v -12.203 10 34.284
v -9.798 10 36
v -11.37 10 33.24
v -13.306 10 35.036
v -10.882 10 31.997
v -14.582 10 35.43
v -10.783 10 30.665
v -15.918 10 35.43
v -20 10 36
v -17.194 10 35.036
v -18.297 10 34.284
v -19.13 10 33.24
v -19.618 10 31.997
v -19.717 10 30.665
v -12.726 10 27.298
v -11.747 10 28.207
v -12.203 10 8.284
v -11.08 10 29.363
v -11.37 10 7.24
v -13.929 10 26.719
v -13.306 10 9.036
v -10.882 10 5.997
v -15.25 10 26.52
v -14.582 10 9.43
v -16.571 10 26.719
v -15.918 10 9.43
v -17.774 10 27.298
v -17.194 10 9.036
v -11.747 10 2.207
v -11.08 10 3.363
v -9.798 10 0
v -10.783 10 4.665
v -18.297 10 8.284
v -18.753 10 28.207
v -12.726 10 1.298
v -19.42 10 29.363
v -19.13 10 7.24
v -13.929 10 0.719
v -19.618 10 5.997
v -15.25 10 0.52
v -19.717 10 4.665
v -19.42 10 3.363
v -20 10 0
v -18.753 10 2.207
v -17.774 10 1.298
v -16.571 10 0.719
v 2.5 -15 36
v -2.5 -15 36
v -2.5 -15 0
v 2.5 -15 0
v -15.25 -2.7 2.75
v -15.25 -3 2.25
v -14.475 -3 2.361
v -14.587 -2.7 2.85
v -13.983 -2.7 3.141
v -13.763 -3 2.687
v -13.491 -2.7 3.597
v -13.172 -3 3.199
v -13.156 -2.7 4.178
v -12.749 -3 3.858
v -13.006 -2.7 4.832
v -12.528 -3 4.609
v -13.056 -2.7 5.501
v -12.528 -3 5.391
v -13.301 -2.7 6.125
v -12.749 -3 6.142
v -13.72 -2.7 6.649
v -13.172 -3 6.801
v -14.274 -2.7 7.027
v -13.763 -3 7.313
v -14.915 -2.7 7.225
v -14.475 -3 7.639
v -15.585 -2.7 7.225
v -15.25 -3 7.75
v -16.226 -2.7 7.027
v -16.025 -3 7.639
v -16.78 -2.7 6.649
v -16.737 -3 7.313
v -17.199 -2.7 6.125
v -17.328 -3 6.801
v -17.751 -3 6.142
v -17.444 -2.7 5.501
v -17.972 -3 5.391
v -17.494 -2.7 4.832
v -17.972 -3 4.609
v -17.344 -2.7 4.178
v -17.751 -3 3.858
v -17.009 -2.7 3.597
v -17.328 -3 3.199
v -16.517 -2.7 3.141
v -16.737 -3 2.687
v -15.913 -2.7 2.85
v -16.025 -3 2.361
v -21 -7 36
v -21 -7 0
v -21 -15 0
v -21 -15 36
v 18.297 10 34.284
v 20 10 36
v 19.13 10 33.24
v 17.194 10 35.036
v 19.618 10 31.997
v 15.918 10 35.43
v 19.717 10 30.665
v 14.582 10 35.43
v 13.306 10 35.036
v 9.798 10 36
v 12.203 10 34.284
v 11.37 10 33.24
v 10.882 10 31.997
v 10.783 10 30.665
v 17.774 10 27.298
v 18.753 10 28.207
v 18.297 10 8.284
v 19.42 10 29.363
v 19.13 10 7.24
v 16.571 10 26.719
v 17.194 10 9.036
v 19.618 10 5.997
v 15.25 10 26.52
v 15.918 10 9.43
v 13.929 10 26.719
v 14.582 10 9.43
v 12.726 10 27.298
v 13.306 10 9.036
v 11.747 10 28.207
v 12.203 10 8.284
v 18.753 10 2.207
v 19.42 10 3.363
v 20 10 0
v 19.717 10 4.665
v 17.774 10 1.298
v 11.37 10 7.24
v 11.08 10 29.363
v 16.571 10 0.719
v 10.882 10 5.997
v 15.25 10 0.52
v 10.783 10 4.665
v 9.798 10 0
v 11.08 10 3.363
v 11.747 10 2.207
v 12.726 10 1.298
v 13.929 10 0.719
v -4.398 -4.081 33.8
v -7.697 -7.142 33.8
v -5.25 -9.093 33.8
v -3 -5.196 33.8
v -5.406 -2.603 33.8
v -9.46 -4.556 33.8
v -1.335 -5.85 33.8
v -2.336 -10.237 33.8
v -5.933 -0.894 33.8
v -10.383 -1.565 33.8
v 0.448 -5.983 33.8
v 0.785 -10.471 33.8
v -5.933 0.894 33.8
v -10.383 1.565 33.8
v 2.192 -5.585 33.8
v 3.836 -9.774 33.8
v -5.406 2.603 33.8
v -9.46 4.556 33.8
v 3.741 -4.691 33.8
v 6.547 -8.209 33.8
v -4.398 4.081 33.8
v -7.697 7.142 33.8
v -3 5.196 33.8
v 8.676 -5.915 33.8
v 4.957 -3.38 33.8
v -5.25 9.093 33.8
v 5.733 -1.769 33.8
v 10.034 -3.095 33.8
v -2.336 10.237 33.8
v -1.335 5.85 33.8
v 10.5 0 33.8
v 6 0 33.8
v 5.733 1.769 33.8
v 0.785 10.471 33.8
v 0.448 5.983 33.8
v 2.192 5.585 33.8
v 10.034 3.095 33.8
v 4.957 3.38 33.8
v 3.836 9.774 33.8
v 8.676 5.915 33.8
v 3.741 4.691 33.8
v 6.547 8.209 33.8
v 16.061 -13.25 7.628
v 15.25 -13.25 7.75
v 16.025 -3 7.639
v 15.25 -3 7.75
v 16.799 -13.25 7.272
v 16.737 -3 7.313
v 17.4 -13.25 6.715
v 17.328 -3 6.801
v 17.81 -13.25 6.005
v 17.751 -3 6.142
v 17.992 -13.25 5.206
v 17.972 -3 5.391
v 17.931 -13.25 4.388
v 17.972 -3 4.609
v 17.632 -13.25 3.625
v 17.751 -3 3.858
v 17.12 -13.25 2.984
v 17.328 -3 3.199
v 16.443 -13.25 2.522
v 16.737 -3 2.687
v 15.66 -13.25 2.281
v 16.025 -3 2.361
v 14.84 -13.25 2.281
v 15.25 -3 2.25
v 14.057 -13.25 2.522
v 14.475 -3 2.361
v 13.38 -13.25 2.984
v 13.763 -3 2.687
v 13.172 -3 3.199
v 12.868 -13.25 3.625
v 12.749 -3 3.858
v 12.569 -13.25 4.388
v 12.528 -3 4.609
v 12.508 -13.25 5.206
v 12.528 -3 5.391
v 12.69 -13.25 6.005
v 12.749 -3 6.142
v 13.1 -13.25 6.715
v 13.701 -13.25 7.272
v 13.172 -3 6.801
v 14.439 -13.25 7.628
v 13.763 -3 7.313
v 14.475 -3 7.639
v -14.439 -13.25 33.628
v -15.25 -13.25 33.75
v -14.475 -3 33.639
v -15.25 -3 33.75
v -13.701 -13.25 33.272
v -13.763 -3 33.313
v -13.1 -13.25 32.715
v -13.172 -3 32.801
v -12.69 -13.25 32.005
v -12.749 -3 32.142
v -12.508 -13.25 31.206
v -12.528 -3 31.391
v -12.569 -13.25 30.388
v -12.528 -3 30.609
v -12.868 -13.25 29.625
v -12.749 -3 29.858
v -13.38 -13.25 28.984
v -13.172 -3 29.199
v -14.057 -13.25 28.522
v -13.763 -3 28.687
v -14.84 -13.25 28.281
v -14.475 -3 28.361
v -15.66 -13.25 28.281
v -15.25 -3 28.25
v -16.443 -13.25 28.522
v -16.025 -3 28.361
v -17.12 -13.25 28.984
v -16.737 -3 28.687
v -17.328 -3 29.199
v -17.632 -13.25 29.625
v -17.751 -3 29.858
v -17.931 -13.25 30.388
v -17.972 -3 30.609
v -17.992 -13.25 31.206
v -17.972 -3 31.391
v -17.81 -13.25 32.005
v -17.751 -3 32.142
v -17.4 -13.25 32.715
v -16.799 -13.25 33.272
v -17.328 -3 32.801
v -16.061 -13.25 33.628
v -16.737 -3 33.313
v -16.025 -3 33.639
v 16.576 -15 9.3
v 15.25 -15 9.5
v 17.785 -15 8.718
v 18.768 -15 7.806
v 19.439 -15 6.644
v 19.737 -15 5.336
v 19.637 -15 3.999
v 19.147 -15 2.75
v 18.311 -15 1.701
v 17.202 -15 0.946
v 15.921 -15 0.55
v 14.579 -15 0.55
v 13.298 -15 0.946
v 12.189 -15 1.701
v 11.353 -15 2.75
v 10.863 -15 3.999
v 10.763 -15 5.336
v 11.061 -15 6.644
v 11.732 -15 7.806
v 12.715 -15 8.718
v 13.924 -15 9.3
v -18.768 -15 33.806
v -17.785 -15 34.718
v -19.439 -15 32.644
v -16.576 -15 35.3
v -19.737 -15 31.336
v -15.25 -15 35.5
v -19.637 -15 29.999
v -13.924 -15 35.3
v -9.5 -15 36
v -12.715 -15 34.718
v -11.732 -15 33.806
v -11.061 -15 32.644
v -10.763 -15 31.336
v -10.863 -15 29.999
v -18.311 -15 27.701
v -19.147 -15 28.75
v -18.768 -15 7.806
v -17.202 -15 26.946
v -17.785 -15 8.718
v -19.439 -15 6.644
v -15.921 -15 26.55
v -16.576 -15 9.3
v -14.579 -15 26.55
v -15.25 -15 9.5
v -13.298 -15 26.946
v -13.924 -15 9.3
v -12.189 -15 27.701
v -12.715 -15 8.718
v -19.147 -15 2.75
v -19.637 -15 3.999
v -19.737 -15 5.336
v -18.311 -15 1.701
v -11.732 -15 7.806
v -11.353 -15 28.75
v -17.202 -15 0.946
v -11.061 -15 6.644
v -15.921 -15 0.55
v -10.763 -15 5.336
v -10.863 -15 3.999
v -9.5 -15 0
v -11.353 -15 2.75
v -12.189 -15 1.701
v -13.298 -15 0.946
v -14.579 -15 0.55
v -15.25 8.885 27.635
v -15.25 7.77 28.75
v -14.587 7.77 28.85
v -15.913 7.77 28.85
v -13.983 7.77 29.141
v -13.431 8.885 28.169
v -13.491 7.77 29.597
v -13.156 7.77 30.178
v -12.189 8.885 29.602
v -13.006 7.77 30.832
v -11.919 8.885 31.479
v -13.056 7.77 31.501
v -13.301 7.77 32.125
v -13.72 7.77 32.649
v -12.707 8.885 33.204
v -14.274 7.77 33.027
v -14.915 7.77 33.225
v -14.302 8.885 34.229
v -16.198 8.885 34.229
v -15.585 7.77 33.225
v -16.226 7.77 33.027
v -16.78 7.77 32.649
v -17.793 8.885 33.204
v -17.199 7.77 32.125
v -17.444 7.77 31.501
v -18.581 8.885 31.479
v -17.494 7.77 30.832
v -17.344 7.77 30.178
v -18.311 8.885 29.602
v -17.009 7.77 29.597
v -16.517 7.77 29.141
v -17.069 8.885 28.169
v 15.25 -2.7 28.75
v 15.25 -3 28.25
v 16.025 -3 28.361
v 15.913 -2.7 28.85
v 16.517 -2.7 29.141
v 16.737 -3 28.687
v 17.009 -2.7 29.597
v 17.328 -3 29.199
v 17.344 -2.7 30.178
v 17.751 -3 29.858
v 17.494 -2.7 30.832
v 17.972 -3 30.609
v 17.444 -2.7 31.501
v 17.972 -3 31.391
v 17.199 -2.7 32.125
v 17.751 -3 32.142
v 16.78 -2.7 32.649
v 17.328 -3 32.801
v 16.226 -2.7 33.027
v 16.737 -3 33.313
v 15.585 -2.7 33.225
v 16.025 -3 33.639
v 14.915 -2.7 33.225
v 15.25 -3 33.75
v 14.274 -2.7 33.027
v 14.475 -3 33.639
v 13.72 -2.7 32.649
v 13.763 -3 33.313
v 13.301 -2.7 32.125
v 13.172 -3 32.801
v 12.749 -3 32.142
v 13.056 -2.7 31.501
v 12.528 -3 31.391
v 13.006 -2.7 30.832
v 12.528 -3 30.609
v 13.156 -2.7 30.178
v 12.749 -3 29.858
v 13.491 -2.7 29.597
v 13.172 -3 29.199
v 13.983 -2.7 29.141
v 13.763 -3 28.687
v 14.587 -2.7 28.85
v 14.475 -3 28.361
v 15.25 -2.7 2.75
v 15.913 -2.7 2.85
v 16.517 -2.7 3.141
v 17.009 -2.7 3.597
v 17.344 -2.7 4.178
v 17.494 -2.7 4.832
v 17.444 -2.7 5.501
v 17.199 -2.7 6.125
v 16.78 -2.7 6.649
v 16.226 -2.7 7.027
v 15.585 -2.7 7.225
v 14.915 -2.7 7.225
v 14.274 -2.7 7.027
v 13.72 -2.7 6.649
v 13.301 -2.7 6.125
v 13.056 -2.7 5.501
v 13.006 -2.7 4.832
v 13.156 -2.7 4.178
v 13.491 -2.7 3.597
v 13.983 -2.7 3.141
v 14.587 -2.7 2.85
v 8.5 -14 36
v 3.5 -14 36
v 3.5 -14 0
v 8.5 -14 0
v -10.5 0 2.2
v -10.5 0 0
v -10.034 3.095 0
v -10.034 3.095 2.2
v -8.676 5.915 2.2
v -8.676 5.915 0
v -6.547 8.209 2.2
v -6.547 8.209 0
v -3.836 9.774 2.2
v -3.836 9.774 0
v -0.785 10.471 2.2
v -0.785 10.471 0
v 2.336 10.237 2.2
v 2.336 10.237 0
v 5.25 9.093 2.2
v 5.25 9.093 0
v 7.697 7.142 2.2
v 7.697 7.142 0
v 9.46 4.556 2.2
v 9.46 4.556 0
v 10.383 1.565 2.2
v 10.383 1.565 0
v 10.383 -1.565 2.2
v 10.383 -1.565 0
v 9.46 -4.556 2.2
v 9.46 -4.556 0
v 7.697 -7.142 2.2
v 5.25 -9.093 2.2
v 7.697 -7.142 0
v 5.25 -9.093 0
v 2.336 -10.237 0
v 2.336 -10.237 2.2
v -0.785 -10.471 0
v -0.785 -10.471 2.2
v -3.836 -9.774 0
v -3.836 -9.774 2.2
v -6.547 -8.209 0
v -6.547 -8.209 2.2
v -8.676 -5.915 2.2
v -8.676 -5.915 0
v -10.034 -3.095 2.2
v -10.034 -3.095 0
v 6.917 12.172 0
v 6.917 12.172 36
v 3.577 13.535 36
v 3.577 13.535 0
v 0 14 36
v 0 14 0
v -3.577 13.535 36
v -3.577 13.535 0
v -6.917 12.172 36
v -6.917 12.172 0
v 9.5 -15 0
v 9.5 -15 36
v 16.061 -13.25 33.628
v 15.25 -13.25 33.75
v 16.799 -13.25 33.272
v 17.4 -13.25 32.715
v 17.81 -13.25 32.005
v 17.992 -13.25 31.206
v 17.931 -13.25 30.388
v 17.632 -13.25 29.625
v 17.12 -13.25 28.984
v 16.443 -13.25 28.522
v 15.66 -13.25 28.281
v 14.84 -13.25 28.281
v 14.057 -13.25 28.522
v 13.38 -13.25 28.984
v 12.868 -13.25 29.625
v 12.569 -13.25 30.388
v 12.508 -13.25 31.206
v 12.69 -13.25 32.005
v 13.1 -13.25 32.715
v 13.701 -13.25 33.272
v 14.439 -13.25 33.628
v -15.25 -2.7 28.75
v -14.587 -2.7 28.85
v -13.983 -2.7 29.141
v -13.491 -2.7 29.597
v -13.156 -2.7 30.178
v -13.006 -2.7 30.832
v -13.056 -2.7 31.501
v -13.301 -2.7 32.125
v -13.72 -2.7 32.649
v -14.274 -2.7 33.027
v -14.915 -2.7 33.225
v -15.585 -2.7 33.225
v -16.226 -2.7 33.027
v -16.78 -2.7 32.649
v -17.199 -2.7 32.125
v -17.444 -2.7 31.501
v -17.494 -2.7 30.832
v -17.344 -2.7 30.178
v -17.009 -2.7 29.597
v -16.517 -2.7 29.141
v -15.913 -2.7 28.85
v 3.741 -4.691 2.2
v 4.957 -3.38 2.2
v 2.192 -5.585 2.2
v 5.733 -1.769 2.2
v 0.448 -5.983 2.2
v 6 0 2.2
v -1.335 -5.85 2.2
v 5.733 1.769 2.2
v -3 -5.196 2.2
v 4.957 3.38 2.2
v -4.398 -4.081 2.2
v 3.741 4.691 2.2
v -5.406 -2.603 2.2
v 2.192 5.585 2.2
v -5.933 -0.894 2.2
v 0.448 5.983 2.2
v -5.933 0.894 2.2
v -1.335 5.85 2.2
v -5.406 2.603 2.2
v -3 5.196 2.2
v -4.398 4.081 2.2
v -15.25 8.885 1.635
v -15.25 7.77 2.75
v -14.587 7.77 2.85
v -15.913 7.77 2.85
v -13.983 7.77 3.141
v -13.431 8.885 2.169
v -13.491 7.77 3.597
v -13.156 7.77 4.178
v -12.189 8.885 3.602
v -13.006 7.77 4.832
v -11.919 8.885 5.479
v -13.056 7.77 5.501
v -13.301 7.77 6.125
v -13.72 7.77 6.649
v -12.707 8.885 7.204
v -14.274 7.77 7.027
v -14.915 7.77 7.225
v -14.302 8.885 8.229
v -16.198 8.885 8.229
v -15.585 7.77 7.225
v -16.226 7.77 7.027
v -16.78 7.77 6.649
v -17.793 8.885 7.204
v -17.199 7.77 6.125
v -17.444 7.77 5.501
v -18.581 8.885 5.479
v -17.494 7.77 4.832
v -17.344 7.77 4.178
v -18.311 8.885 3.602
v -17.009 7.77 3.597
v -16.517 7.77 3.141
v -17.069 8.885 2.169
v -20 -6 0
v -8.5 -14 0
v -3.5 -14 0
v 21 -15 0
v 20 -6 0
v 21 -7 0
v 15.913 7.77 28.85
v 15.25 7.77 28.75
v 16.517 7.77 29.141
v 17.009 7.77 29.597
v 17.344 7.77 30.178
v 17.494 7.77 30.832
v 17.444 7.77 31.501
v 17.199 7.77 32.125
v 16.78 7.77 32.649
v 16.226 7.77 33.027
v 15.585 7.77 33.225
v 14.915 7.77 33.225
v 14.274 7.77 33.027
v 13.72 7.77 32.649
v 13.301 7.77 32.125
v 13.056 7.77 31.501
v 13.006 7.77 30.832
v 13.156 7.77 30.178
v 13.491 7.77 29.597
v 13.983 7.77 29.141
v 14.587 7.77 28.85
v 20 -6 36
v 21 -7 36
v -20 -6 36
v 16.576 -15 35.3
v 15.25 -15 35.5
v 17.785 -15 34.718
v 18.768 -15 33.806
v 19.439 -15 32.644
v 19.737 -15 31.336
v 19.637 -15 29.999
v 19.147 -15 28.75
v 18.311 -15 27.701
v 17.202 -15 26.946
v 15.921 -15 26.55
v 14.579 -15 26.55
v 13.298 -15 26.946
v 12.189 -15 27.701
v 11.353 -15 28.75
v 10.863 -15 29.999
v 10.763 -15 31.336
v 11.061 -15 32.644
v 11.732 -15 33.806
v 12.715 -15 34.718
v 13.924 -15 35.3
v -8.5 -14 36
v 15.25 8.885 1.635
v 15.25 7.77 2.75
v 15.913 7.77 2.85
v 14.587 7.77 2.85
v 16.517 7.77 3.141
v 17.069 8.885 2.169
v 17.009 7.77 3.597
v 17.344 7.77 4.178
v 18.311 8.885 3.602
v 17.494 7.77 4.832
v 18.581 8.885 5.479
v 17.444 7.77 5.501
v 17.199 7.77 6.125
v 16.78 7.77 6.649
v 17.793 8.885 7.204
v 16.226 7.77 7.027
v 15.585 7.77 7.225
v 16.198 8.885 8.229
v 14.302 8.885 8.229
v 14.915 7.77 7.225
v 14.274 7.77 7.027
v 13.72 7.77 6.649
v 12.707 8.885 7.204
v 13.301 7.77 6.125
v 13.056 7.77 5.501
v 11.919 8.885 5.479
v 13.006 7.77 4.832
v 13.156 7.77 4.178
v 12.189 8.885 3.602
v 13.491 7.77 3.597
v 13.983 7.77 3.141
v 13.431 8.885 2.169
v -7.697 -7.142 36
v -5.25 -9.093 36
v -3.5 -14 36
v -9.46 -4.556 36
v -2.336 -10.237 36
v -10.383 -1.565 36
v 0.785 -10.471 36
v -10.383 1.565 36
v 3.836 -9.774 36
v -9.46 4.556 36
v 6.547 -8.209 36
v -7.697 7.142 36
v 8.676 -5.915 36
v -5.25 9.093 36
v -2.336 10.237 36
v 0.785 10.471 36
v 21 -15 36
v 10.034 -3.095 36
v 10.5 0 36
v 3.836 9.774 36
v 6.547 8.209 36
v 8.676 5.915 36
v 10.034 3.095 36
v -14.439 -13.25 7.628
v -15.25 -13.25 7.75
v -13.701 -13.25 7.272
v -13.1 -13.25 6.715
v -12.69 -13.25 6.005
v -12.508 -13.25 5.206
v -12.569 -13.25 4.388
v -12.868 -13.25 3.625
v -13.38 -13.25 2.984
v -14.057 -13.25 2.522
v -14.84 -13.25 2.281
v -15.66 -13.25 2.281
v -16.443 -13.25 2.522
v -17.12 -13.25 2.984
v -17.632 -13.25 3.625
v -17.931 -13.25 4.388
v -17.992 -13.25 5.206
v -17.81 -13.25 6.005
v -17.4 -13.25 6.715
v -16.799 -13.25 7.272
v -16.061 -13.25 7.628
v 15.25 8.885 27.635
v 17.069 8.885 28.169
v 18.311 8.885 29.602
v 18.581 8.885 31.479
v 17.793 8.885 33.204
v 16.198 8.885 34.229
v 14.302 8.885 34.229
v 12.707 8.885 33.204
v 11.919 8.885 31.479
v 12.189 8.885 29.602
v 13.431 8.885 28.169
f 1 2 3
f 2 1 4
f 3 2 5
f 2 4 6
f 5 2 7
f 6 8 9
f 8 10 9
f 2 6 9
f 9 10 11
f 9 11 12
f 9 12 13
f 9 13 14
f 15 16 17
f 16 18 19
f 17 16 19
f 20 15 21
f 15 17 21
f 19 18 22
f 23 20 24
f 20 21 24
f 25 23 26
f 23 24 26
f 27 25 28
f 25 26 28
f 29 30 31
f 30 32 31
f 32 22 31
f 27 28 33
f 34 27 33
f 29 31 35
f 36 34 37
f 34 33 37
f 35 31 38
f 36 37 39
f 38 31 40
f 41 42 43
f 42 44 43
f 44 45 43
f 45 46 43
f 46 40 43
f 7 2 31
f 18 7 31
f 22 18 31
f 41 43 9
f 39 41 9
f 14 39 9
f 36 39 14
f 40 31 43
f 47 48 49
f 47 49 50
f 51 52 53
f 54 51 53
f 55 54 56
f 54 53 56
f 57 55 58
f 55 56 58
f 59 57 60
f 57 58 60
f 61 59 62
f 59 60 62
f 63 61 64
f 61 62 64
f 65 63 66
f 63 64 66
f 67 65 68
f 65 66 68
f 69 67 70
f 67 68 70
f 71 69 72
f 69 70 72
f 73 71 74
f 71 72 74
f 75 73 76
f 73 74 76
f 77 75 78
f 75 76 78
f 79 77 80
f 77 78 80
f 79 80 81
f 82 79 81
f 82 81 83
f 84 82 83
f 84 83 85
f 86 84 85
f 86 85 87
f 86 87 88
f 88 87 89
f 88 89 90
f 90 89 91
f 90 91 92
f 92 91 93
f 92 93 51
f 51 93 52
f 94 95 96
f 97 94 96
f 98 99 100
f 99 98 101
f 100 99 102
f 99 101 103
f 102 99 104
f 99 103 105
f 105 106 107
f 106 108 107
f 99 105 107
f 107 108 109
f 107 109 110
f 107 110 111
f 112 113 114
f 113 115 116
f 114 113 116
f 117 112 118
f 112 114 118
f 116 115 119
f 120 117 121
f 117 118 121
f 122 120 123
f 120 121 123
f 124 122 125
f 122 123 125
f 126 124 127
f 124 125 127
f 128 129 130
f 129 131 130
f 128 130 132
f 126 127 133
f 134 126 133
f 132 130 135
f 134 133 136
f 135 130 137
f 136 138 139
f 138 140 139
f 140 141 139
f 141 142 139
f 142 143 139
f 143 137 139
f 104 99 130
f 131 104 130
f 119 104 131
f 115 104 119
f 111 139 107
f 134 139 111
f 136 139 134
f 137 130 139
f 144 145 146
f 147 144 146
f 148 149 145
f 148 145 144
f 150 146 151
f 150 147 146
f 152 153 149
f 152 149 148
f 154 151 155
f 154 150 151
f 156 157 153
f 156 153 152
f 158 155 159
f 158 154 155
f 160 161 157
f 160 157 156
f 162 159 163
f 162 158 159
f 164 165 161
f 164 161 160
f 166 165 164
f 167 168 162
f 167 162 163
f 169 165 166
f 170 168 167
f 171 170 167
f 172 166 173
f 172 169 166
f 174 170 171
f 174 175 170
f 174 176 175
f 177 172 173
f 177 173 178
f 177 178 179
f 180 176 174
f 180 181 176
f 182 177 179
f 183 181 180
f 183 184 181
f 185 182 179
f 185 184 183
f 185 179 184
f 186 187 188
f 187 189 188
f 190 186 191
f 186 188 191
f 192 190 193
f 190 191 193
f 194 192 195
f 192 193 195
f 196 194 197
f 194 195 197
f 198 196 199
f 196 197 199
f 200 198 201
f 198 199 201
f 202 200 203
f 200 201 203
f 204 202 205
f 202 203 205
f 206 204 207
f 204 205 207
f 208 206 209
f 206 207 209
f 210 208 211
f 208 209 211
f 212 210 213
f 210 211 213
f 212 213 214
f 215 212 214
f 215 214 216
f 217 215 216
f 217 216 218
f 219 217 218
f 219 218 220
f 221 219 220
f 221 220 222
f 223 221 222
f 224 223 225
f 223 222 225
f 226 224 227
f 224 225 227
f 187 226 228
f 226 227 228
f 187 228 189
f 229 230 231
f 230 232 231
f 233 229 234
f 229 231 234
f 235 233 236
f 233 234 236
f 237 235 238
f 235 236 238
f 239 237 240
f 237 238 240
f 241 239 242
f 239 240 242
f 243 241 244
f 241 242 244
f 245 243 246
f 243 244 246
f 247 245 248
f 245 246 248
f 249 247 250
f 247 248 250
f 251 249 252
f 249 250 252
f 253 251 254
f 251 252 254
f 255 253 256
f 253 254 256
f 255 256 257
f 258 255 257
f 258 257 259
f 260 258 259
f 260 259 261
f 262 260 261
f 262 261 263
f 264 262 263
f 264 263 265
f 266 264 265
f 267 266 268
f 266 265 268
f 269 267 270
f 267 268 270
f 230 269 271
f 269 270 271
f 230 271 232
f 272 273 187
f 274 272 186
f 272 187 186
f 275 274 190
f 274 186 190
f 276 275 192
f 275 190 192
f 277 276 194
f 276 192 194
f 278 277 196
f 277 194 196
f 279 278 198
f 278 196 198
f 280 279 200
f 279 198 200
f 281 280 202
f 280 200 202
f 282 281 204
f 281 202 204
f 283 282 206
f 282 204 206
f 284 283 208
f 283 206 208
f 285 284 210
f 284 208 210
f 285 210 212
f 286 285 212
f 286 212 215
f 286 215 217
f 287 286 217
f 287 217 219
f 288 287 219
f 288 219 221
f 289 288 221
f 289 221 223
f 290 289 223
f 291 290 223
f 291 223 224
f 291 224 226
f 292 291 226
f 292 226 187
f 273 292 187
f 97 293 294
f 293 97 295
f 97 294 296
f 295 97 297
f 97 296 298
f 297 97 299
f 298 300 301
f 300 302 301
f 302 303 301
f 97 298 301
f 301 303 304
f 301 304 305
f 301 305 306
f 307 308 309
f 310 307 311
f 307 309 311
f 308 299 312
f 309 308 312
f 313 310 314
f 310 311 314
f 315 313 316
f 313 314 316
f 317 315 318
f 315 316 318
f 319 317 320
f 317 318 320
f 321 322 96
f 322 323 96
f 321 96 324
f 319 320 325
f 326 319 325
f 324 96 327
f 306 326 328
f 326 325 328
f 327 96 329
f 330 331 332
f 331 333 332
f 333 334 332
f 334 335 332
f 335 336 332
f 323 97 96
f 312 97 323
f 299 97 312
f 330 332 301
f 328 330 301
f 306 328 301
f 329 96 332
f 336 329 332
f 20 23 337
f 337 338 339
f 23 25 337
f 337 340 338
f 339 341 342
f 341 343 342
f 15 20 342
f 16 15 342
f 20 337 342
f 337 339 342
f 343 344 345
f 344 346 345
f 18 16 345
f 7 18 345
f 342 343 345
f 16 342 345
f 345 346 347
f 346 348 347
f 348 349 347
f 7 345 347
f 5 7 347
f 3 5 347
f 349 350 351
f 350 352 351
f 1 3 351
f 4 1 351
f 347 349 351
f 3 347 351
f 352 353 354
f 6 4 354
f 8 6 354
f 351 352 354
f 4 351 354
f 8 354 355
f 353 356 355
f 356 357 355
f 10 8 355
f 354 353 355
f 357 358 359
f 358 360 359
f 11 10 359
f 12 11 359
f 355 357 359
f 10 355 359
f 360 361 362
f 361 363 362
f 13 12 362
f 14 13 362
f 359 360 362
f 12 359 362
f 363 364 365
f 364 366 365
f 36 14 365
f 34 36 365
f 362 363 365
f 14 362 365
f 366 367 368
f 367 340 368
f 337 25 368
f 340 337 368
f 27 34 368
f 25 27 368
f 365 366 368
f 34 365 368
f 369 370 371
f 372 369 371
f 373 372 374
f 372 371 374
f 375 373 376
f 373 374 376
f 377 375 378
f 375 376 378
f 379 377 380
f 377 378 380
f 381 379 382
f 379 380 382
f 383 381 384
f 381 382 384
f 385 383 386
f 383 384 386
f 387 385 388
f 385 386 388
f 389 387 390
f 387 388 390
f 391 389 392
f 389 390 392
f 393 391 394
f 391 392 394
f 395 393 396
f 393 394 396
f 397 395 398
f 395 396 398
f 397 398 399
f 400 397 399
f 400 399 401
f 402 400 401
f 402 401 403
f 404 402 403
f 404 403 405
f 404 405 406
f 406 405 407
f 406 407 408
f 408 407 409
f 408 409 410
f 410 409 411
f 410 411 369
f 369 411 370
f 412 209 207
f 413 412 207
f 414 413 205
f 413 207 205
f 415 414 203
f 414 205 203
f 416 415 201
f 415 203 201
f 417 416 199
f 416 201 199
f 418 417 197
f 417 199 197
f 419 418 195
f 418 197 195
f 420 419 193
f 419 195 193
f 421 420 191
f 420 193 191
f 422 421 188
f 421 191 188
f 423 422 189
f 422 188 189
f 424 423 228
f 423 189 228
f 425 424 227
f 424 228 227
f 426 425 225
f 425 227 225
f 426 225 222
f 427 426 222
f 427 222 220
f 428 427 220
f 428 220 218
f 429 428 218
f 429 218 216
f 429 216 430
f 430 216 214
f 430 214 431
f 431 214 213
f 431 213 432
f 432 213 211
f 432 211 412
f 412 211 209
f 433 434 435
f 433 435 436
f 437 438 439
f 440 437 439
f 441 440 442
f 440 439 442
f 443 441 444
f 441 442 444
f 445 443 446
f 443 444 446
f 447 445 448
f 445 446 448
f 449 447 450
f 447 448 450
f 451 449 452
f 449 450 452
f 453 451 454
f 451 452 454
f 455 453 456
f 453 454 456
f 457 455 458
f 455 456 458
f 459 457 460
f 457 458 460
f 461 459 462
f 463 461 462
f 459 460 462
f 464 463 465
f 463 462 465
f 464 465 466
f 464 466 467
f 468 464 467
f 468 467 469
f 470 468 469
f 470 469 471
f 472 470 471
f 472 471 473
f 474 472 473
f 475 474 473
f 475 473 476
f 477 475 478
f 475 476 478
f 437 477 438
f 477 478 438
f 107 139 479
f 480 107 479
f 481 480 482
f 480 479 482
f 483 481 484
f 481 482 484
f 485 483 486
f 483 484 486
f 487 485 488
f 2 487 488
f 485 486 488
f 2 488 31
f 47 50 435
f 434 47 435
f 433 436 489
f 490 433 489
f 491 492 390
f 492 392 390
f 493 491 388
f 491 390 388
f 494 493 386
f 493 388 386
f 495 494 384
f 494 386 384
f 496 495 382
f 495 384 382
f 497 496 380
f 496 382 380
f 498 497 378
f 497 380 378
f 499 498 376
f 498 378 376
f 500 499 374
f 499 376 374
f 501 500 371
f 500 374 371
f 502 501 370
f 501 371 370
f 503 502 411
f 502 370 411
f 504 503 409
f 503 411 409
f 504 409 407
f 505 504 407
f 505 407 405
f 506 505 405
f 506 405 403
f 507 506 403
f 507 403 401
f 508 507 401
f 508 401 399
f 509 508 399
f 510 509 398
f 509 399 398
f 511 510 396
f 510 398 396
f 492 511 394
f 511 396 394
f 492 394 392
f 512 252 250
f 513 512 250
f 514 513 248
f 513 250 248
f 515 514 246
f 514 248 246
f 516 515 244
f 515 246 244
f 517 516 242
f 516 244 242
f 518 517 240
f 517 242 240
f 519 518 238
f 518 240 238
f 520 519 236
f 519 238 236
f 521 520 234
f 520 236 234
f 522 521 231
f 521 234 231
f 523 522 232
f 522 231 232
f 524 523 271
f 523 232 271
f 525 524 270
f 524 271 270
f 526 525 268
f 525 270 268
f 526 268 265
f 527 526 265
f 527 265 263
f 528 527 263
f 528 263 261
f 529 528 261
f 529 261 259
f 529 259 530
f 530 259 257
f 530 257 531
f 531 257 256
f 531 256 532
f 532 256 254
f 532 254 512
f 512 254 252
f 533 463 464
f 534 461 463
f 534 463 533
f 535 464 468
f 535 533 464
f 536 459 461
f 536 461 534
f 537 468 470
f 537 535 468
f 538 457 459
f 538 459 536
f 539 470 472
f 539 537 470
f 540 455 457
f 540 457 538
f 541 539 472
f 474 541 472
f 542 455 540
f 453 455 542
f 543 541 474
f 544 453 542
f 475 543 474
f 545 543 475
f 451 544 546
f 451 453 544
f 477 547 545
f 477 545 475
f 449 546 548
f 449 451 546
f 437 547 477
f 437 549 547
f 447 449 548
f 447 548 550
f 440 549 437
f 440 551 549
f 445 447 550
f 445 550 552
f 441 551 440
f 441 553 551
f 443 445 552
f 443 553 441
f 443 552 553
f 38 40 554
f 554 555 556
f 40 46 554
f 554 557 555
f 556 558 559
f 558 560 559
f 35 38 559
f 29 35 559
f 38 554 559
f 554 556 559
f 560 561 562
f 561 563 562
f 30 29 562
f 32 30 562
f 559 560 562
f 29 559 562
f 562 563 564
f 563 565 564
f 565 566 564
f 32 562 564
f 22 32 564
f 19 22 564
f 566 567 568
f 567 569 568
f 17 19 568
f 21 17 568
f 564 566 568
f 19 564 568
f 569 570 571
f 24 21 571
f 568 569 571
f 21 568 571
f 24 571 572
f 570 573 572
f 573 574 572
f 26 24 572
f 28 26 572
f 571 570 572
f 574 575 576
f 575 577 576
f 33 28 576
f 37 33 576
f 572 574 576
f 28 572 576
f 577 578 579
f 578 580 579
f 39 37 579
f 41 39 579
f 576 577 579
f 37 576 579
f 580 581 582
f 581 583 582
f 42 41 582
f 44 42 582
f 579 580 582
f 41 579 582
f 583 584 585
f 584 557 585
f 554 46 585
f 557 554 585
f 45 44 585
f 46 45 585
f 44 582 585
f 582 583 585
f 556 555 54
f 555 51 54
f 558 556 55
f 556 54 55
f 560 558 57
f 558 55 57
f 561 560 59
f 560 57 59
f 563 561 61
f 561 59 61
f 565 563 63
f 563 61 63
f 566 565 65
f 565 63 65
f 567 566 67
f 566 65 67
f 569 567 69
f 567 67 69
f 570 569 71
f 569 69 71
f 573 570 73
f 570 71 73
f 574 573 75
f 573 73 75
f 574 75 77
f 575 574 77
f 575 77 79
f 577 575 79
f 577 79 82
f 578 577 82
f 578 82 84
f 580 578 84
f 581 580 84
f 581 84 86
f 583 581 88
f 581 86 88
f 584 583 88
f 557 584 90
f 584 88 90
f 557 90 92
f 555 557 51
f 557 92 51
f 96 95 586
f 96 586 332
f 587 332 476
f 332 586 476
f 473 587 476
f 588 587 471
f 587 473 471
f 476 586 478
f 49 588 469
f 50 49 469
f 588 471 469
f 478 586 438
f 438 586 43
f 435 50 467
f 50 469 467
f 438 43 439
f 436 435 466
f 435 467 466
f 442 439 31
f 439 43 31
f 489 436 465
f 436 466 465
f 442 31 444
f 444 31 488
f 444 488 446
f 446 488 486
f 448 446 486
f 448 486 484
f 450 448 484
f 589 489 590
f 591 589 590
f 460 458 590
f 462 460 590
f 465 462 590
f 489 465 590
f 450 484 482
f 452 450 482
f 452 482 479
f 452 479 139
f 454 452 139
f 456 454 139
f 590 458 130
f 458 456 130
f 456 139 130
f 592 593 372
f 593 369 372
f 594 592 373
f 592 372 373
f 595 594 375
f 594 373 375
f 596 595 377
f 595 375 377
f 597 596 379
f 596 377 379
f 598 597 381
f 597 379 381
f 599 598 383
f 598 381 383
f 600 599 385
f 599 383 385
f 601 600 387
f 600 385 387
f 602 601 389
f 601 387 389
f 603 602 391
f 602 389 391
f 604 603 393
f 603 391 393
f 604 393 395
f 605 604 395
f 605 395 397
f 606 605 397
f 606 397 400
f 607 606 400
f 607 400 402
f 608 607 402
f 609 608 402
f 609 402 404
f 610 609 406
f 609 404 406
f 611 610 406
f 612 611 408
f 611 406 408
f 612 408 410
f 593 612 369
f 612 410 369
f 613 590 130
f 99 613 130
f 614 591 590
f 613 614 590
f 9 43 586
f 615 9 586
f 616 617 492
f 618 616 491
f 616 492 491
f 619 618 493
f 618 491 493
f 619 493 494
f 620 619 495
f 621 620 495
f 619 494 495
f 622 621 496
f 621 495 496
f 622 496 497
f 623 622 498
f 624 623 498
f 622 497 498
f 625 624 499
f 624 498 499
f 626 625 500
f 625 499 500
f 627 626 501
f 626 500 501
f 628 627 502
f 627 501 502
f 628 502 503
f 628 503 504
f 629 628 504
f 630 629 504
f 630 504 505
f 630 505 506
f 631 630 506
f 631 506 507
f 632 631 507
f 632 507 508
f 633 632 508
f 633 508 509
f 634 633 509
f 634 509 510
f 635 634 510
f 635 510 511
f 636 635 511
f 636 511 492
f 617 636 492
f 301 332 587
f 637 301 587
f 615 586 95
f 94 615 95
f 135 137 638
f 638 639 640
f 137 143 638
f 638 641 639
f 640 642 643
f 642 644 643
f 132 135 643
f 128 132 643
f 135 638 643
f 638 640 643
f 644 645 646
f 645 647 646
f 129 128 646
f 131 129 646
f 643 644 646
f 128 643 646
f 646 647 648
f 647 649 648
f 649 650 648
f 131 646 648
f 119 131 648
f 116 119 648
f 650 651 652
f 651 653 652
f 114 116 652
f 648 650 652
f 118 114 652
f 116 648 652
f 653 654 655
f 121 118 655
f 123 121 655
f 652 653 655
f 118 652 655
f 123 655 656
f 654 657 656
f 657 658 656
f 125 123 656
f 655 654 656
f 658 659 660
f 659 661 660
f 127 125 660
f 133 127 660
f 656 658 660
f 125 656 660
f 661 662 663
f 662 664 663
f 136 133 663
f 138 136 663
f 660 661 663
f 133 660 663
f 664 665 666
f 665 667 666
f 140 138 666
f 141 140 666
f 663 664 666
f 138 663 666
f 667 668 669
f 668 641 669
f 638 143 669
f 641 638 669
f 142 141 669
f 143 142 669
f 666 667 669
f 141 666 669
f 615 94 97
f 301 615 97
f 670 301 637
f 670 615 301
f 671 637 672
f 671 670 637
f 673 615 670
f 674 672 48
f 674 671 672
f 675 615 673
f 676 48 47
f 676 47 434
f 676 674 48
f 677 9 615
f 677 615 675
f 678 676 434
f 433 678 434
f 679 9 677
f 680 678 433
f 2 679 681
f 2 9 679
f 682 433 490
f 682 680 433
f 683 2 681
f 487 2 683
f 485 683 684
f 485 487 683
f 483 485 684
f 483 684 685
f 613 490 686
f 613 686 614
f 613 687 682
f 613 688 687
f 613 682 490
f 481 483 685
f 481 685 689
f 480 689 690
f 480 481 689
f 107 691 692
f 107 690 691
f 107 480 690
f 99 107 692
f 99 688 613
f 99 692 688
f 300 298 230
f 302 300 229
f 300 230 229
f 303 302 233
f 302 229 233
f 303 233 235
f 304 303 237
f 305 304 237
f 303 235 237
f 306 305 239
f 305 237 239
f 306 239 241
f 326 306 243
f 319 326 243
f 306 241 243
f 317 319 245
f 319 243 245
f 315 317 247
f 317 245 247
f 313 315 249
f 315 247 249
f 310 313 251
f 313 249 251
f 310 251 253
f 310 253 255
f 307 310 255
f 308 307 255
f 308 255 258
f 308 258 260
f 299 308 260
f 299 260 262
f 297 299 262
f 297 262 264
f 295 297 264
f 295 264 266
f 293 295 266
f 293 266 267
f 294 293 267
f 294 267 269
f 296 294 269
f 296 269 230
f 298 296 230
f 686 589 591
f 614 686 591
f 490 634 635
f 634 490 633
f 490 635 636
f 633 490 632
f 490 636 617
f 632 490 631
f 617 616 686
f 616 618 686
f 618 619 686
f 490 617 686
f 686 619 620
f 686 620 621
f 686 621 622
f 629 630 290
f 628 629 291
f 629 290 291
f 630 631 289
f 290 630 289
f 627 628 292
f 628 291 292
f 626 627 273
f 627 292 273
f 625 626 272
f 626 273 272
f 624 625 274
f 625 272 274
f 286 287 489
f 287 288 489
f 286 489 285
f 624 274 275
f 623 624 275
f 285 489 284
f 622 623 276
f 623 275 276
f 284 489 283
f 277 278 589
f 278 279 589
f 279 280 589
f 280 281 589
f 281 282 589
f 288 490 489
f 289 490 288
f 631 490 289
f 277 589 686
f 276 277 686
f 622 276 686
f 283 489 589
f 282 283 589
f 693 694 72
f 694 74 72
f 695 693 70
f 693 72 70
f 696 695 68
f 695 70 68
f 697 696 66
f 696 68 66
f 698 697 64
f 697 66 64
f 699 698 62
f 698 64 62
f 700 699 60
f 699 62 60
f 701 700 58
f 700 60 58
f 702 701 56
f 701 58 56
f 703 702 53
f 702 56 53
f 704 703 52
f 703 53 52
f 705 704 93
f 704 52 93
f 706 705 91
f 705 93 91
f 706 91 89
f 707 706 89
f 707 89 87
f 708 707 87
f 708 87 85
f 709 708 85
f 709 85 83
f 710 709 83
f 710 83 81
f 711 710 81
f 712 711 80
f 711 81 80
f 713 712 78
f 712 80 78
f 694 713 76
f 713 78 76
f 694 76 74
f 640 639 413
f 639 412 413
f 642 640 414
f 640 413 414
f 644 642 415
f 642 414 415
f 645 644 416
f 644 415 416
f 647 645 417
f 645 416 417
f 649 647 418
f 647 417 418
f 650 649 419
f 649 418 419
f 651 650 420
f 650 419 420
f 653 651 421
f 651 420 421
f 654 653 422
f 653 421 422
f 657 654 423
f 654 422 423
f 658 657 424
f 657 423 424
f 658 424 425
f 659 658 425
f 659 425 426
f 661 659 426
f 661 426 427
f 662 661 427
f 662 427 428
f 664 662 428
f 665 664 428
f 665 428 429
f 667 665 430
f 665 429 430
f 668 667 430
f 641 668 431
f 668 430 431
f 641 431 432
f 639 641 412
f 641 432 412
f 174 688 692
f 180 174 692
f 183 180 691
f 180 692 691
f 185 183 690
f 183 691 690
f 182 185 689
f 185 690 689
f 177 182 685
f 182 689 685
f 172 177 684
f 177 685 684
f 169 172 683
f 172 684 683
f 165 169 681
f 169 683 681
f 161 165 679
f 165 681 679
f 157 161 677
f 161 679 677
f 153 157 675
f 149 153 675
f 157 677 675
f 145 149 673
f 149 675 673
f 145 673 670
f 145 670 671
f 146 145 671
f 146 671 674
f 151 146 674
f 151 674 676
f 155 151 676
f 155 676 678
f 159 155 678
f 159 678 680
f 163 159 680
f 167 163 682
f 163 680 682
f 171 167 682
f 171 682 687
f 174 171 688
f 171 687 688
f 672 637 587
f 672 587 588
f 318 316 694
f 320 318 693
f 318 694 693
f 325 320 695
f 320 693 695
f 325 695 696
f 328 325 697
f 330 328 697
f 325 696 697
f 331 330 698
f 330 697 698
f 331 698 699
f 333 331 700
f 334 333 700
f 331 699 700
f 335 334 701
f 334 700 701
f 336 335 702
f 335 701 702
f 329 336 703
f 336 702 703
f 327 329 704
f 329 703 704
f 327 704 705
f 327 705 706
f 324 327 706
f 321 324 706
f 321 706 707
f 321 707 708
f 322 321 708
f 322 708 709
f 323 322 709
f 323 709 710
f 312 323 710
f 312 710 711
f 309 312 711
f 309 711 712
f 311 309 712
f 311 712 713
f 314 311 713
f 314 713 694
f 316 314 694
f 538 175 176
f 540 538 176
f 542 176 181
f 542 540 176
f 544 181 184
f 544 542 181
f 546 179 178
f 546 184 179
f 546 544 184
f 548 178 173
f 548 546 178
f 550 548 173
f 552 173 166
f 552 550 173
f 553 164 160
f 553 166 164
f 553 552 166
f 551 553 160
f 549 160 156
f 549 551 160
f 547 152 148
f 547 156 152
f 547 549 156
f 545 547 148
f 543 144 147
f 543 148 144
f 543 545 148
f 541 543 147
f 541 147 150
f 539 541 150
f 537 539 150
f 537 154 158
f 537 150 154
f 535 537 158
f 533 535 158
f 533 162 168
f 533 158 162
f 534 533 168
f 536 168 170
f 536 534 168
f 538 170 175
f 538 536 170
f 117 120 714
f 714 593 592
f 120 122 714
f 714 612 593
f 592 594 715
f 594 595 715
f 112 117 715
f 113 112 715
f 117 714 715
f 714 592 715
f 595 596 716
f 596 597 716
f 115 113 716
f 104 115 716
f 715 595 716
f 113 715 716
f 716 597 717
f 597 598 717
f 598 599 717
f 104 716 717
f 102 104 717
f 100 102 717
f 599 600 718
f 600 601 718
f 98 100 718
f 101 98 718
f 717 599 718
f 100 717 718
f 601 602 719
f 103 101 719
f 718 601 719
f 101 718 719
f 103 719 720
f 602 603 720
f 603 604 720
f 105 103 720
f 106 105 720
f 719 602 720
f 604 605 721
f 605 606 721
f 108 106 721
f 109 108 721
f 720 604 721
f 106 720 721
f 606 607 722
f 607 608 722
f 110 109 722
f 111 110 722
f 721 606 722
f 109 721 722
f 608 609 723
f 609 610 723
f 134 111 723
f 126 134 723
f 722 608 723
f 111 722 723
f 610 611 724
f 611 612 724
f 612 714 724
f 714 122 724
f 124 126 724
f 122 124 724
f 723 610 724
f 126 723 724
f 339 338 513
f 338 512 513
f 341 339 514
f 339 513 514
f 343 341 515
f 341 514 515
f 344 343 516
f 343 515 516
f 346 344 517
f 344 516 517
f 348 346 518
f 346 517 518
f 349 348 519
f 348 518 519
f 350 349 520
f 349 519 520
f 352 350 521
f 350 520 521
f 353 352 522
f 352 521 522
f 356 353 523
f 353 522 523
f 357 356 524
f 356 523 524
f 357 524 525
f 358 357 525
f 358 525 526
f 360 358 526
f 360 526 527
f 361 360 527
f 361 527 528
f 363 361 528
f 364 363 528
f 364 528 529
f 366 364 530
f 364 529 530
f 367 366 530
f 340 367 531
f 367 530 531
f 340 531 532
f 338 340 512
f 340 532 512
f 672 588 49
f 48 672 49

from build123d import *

# Parameters (mm, degrees)
ESBO_O1_R                                            = 6
EXTRUS_O1_DEPTH                                      = 36
ESBO_O2_R                                            = 10.5
EXTRUS_O2_DEPTH                                      = 2.2
ESBO_O3_R                                            = 10.5
EXTRUS_O3_DEPTH                                      = 2.2
ESBO_O4_R                                            = 1.65
EXTRUS_O4_DEPTH                                      = 26
ESCAREADO_PARA_PARAFUSO_DE_M_QUINA_COM_C_D           = 5.5
ESCAREADO_PARA_PARAFUSO_DE_M_QUINA_COM_C_DEPTH       = 12
ESCAREADO_PARA_PARAFUSO_DE_M_QUINA_COM_C_CSINK_D     = 9
ESCAREADO_PARA_PARAFUSO_DE_M_QUINA_COM_C_CSINK_ANGLE = 90
ESCAREADO_PARA_PARAFUSO_DE_M_QUINA_COM_C_TIP         = 1.652366702
ESCAREADO_PARA_SFHCS_M41_D                           = 4.5
ESCAREADO_PARA_SFHCS_M41_CSINK_D                     = 8.96
ESCAREADO_PARA_SFHCS_M41_CSINK_ANGLE                 = 90


with BuildPart() as part:
    # Esboço1 → Extrusão1 (new body)
    with BuildSketch(Plane.XY):
        with BuildLine():
            Line((-20, 10), (-20, -6))
            Line((-20, -6), (-21, -7))
            Line((-21, -7), (-21, -15))
            Line((-21, -15), (-9.5, -15))
            Line((-9.5, -15), (-8.5, -14))
            Line((-8.5, -14), (-3.5, -14))
            Line((-3.5, -14), (-2.5, -15))
            Line((-2.5, -15), (2.5, -15))
            Line((2.5, -15), (3.5, -14))
            Line((3.5, -14), (8.5, -14))
            Line((8.5, -14), (9.5, -15))
            Line((9.5, -15), (21, -15))
            Line((21, -15), (21, -7))
            Line((21, -7), (20, -6))
            Line((20, -6), (20, 10))
            Line((20, 10), (9.797958971, 10))
            ThreePointArc((9.797958971, 10), (0, 14), (-9.797958971, 10))
            Line((-9.797958971, 10), (-20, 10))
        make_face()
        Circle(ESBO_O1_R, mode=Mode.SUBTRACT)
    extrude(amount=EXTRUS_O1_DEPTH)

    # Esboço2 → Extrusão2 (cut)
    with BuildSketch(Plane.XY.offset(36)):
        Circle(ESBO_O2_R)
    extrude(amount=-EXTRUS_O2_DEPTH, mode=Mode.SUBTRACT)

    # Esboço3 → Extrusão3 (cut)
    with BuildSketch(Plane(origin=(0, 0, 0), x_dir=(-1, 0, 0), z_dir=(0, 0, -1))):
        Circle(ESBO_O3_R)
    extrude(amount=-EXTRUS_O3_DEPTH, mode=Mode.SUBTRACT)

    # Esboço4 → Extrusão4 (cut, through all)
    with BuildSketch(Plane(origin=(0, 10, 0), x_dir=(1, 0, 0), z_dir=(0, 1, 0))):
        with Locations((15.25, -5)):
            Circle(ESBO_O4_R)
        with Locations((15.25, -31)):
            Circle(ESBO_O4_R)
        with Locations((-15.25, -5)):
            Circle(ESBO_O4_R)
        with Locations((-15.25, -31)):
            Circle(ESBO_O4_R)
    extrude(amount=-EXTRUS_O4_DEPTH, mode=Mode.SUBTRACT)

    # Escareado para parafuso de máquina com cabeça chata de M52
    with Locations(Plane(origin=(-15.25, -15, 31), x_dir=(0, 0, -1), z_dir=(0, -1, 0))):
        with Locations((0, 0), (26, 0), (26, 30.5), (0, 30.5)):
            CounterSinkHole(ESCAREADO_PARA_PARAFUSO_DE_M_QUINA_COM_C_D / 2, ESCAREADO_PARA_PARAFUSO_DE_M_QUINA_COM_C_CSINK_D / 2, depth=ESCAREADO_PARA_PARAFUSO_DE_M_QUINA_COM_C_DEPTH, counter_sink_angle=ESCAREADO_PARA_PARAFUSO_DE_M_QUINA_COM_C_CSINK_ANGLE)
            with Locations((0, 0, -(ESCAREADO_PARA_PARAFUSO_DE_M_QUINA_COM_C_DEPTH + ESCAREADO_PARA_PARAFUSO_DE_M_QUINA_COM_C_TIP / 2))):  # 118° drill point
                Cone(0, ESCAREADO_PARA_PARAFUSO_DE_M_QUINA_COM_C_D / 2, ESCAREADO_PARA_PARAFUSO_DE_M_QUINA_COM_C_TIP, mode=Mode.SUBTRACT)

    # Escareado para SFHCS M41 (through all)
    with Locations(Plane(origin=(-15.25, 10, 5), x_dir=(0, 0, 1), z_dir=(0, 1, 0))):
        with Locations((0, 0), (26, 0), (26, 30.5), (0, 30.5)):
            CounterSinkHole(ESCAREADO_PARA_SFHCS_M41_D / 2, ESCAREADO_PARA_SFHCS_M41_CSINK_D / 2, counter_sink_angle=ESCAREADO_PARA_SFHCS_M41_CSINK_ANGLE)


solid = part.part
